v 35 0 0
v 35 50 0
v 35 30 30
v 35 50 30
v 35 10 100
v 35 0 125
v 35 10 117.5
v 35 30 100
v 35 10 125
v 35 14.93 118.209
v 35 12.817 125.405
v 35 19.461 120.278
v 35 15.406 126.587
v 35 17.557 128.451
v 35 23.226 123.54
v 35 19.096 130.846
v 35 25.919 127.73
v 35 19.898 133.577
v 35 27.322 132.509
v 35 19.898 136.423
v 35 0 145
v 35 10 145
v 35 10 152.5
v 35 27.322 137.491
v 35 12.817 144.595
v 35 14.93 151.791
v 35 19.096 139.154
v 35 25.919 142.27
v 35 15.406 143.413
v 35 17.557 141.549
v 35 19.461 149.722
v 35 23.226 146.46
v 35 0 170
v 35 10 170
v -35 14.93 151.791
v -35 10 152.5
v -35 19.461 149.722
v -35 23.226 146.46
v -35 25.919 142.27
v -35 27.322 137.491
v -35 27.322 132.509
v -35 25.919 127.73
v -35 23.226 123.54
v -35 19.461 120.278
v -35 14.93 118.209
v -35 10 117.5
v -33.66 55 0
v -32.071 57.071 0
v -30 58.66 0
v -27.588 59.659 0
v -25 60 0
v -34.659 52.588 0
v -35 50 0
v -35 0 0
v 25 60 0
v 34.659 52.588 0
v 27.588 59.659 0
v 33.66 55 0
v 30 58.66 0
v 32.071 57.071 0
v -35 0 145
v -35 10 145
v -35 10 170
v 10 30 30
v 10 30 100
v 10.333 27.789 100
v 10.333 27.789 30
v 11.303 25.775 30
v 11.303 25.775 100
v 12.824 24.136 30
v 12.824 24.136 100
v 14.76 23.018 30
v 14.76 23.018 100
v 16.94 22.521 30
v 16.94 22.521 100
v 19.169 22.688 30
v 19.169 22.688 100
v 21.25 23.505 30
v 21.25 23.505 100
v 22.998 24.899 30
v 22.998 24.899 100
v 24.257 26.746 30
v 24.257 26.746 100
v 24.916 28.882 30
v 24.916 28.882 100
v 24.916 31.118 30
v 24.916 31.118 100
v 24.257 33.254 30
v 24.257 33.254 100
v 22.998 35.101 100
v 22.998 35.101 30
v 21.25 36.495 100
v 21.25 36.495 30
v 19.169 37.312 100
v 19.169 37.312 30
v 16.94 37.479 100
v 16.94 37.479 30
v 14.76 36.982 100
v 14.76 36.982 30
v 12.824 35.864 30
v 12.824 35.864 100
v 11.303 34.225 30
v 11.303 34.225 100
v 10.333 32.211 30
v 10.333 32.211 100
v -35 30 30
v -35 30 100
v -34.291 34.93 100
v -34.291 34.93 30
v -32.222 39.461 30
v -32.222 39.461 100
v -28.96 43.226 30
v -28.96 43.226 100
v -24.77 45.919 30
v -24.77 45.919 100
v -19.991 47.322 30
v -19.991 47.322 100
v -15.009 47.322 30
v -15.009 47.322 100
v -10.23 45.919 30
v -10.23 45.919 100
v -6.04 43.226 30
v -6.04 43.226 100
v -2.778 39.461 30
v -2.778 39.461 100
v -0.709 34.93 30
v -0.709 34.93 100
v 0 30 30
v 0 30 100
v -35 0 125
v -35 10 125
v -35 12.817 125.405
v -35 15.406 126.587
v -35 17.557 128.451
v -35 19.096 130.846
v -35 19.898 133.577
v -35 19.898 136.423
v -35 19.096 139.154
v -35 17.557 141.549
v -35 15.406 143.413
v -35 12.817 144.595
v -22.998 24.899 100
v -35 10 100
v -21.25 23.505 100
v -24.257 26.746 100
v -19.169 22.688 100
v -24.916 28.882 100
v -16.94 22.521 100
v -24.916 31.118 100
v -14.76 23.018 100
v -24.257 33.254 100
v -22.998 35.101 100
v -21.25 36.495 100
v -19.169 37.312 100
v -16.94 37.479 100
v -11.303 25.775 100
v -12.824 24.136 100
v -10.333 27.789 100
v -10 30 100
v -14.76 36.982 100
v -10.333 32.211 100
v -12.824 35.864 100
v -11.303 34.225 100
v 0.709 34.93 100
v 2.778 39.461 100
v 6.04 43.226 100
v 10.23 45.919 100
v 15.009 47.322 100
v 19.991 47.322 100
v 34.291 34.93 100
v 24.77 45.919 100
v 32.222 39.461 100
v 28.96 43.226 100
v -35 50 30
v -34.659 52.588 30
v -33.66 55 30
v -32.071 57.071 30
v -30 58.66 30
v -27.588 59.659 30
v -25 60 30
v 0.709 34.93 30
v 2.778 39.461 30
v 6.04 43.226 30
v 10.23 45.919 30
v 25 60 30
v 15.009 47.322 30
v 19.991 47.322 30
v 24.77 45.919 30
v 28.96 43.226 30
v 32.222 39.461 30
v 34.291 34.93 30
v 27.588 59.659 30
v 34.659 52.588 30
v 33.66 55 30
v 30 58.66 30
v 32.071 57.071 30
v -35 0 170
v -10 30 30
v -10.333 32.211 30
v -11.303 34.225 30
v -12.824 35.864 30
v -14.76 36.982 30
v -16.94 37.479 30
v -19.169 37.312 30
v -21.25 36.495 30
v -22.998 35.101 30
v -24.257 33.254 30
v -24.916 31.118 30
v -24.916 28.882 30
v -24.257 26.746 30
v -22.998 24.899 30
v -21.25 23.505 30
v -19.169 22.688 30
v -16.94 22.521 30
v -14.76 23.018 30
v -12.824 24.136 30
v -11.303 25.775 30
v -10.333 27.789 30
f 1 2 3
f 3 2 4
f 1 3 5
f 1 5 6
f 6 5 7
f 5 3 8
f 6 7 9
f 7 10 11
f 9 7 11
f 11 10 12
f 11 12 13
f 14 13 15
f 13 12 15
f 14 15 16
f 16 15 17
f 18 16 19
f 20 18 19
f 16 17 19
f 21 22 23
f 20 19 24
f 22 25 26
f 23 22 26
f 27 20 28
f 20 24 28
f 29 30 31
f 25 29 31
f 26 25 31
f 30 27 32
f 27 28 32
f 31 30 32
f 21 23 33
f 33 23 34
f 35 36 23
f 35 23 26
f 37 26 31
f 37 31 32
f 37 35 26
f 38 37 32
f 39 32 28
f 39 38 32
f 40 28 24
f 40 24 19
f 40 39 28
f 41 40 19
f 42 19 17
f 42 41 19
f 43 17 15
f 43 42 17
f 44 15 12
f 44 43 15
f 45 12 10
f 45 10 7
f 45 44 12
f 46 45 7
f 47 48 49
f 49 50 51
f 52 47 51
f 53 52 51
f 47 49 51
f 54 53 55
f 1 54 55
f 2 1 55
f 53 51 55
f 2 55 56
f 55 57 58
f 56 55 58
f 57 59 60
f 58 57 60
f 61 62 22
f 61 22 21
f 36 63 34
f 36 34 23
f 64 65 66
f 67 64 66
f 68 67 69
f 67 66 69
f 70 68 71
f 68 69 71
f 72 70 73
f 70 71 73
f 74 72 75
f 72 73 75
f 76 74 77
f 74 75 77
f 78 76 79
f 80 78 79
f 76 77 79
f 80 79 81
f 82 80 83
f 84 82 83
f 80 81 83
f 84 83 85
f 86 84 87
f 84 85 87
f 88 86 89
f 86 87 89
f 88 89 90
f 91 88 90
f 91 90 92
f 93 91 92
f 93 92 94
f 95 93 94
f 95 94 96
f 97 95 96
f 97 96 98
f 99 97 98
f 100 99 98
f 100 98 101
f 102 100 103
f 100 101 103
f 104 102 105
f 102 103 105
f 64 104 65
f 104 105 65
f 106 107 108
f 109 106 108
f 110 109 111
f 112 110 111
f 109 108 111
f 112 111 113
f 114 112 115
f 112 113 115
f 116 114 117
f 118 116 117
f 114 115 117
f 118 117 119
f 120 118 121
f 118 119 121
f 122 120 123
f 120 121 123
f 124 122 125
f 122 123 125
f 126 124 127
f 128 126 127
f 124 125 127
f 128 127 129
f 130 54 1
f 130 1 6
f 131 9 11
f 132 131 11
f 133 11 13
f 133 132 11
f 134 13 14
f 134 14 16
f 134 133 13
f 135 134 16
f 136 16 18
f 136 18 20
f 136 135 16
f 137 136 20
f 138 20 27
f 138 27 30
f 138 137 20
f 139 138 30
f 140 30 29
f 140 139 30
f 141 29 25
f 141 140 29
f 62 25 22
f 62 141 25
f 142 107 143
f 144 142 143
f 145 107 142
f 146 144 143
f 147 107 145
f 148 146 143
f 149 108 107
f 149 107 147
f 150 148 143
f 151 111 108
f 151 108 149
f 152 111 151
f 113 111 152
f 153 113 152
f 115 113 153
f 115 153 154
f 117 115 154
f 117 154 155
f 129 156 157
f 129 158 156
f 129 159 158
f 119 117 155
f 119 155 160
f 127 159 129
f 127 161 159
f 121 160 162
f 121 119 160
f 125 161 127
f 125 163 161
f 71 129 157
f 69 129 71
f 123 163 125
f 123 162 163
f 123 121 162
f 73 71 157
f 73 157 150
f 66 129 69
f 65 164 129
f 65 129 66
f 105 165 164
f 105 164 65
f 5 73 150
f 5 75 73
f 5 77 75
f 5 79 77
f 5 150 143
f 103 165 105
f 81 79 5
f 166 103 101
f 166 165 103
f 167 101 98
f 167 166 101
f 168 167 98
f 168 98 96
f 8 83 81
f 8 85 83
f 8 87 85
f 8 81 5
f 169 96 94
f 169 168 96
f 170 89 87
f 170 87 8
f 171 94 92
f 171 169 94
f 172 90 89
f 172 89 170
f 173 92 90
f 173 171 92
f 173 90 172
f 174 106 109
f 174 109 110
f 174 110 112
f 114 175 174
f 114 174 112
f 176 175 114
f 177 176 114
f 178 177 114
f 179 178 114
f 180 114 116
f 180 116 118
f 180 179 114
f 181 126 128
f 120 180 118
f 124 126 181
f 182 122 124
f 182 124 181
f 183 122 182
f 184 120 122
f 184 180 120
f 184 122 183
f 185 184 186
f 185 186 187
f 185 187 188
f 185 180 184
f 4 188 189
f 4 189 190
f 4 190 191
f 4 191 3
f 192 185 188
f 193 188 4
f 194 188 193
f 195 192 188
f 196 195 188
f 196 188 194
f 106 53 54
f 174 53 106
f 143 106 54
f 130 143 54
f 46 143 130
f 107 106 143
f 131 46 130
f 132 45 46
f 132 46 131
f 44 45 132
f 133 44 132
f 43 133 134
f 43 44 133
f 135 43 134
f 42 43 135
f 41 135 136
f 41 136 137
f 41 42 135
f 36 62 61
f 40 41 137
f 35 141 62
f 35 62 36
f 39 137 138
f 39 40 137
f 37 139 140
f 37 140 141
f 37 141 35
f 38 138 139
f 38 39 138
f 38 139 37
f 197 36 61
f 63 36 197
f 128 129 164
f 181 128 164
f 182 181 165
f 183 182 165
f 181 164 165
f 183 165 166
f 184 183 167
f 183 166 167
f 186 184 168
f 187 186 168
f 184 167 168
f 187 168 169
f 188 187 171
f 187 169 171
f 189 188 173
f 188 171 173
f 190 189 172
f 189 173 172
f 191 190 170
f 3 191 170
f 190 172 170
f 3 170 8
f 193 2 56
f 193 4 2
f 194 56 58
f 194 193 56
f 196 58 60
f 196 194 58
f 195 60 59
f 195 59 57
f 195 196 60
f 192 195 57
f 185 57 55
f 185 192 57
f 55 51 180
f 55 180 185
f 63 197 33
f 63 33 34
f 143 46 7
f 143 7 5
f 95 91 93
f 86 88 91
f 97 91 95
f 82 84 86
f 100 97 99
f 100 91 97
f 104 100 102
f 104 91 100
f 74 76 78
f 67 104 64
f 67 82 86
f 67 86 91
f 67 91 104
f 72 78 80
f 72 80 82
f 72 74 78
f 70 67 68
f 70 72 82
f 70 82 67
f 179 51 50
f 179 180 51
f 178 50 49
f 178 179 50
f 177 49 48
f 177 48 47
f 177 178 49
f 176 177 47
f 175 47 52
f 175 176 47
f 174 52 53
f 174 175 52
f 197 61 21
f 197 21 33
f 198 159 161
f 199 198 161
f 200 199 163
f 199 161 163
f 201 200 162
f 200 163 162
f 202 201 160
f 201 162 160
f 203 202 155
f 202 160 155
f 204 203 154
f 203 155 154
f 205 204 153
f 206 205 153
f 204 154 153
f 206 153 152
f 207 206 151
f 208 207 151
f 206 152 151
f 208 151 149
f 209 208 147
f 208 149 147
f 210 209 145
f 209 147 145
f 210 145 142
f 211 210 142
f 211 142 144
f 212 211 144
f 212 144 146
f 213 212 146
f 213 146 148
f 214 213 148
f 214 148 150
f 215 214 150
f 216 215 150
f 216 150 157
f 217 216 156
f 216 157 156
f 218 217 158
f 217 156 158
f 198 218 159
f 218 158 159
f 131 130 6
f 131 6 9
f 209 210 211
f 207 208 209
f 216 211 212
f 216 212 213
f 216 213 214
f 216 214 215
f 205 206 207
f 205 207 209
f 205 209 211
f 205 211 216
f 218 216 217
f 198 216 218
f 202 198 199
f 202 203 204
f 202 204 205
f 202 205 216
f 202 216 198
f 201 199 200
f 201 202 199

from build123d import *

# Parameters (mm, degrees)
SKETCH2_W           = 70
SKETCH2_H           = 60
BOSS_EXTRUDE1_DEPTH = 100
SKETCH3_R           = 7.5
CUT_EXTRUDE1_DEPTH  = 70
BOSS_EXTRUDE2_DEPTH = 70
FILLET1_R           = 10


with BuildPart() as part:
    # Sketch2 → Boss-Extrude1 (new body)
    with BuildSketch(Plane.XY):
        with Locations((0, 30)):
            Rectangle(SKETCH2_W, SKETCH2_H)
    extrude(amount=BOSS_EXTRUDE1_DEPTH)

    # Sketch3 → Cut-Extrude1 (cut)
    with BuildSketch(Plane.XY.offset(100)):
        with Locations((-17.5, 30)):
            Circle(SKETCH3_R)
        with Locations(Location((17.5, 30, 0), (0, 0, 180))):
            Circle(SKETCH3_R)
        with BuildLine():
            Line((35, 60), (-35, 60))
            Line((-35, 60), (-35, 30))
            ThreePointArc((-35, 30), (-17.5, 47.5), (0, 30))
            ThreePointArc((0, 30), (17.5, 47.5), (35, 30))
            Line((35, 30), (35, 60))
        make_face()
    extrude(amount=-CUT_EXTRUDE1_DEPTH, mode=Mode.SUBTRACT)

    # Sketch4 → Boss-Extrude2 (add)
    with BuildSketch(Plane.ZY.offset(35)):
        with BuildLine():
            Line((100, 0), (125, 0))
            Line((125, 0), (125, 10))
            ThreePointArc((125, 10), (135, 20), (145, 10))
            Line((145, 10), (145, 0))
            Line((145, 0), (170, 0))
            Line((170, 0), (170, 10))
            Line((170, 10), (152.5, 10))
            ThreePointArc((152.5, 10), (135, 27.5), (117.5, 10))
            Line((117.5, 10), (100, 10))
            Line((100, 10), (100, 0))
        make_face()
    extrude(amount=-BOSS_EXTRUDE2_DEPTH)

    # Fillet1
    fillet1_edges = [part.edges().sort_by_distance(p)[0] for p in [
        (-35, 60, 15),
        (35, 60, 15),
    ]]
    fillet(fillet1_edges, radius=FILLET1_R)


solid = part.part
